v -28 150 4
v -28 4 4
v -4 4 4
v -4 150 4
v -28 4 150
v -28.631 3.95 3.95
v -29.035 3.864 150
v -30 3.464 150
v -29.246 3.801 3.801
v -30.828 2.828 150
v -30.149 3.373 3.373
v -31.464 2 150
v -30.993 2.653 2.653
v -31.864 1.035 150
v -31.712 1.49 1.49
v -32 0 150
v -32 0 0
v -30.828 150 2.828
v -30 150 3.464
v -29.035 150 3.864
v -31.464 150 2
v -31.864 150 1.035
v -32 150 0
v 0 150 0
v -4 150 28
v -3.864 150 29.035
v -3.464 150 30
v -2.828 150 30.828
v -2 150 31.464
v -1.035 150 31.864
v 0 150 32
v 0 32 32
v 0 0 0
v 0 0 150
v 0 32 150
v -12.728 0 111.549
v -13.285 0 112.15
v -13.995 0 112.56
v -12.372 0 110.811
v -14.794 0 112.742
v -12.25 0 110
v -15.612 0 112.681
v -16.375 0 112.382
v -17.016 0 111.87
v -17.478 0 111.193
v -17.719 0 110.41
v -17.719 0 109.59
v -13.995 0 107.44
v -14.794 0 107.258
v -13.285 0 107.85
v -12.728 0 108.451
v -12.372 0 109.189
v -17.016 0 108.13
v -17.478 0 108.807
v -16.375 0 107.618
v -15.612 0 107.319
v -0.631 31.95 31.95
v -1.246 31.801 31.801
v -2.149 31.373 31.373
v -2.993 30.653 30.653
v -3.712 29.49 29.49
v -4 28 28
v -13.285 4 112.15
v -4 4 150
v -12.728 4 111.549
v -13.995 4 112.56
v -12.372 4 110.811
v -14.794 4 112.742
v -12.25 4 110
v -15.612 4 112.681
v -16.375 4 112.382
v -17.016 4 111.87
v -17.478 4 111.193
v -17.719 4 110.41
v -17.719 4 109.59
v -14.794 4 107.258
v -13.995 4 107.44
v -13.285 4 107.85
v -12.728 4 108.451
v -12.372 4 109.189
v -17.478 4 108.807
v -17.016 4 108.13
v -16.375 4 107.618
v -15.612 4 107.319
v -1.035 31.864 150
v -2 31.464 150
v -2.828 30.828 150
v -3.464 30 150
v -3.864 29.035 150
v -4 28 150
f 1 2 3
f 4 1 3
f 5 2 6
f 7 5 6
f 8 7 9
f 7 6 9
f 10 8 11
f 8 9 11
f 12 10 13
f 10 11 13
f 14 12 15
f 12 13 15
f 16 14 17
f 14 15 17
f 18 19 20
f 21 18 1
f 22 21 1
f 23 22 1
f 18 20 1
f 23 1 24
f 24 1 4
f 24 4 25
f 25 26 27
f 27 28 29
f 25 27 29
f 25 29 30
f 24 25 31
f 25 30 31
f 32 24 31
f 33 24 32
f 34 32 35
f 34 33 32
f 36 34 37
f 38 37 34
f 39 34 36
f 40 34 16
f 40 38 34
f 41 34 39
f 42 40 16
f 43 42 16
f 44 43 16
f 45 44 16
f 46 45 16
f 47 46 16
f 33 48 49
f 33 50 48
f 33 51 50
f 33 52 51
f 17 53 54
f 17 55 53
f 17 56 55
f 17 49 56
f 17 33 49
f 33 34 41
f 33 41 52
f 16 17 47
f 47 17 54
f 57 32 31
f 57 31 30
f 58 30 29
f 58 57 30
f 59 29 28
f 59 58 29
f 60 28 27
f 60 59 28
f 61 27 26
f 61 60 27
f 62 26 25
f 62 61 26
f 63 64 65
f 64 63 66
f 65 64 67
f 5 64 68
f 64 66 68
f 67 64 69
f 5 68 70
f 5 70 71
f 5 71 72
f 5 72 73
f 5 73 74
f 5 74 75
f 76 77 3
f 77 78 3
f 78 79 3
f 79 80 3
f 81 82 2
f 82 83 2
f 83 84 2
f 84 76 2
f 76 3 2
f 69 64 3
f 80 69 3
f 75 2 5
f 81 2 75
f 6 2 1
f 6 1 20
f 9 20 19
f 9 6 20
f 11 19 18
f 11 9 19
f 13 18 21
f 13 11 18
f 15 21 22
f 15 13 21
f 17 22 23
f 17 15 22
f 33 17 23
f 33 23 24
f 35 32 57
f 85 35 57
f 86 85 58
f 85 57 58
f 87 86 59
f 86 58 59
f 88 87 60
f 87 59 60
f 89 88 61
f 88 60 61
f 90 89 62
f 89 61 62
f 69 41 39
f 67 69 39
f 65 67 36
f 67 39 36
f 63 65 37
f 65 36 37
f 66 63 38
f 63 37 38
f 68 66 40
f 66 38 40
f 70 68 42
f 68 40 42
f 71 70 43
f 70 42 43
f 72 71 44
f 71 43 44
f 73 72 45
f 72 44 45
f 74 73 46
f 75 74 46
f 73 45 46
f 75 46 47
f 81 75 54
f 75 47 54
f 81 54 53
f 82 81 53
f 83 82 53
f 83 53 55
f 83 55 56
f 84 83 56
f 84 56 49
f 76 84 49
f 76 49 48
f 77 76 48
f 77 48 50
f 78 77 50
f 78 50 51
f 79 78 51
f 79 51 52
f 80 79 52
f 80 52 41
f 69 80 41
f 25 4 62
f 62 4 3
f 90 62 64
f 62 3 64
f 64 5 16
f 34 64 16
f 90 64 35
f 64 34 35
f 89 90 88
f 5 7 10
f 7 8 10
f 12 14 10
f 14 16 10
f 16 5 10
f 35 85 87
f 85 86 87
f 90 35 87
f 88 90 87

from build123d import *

# Parameters (mm, degrees)
PAD003_DEPTH    = 150
PAD004_DEPTH    = 150
SKETCH012_R     = 2.75
POCKET001_DEPTH = 150.001


with BuildPart() as part:
    # Sketch003 → Pad003 (new body)
    with BuildSketch(Plane.XY):
        with BuildLine():
            Line((0, 32), (0, 0))
            Line((0, 0), (-32, 0))
            ThreePointArc((-28, 4), (-30.828427, 2.828427), (-32, 0))
            Line((-4, 4), (-28, 4))
            Line((-4, 28), (-4, 4))
            ThreePointArc((0, 32), (-2.828427, 30.828427), (-4, 28))
        make_face()
    extrude(amount=PAD003_DEPTH)

    # Sketch004 (on Face3 of Pad003) → Pad004 (new body)
    with BuildSketch(Plane.XZ):
        with BuildLine():
            Line((-32, 0), (0, 0))
            Line((0, 0), (0, 32))
            ThreePointArc((0, 32), (-2.828427, 30.828427), (-4, 28))
            Line((-4, 4), (-4, 28))
            Line((-28, 4), (-4, 4))
            ThreePointArc((-28, 4), (-30.828427, 2.828427), (-32, 0))
        make_face()
    extrude(amount=-PAD004_DEPTH)

    # Sketch012 (on Face9 of Pad004) → Pocket001 (cut, through all)
    with BuildSketch(Plane.XZ):
        with Locations((-15, 110)):
            Circle(SKETCH012_R)
    extrude(amount=-POCKET001_DEPTH, mode=Mode.SUBTRACT)


solid = part.part
